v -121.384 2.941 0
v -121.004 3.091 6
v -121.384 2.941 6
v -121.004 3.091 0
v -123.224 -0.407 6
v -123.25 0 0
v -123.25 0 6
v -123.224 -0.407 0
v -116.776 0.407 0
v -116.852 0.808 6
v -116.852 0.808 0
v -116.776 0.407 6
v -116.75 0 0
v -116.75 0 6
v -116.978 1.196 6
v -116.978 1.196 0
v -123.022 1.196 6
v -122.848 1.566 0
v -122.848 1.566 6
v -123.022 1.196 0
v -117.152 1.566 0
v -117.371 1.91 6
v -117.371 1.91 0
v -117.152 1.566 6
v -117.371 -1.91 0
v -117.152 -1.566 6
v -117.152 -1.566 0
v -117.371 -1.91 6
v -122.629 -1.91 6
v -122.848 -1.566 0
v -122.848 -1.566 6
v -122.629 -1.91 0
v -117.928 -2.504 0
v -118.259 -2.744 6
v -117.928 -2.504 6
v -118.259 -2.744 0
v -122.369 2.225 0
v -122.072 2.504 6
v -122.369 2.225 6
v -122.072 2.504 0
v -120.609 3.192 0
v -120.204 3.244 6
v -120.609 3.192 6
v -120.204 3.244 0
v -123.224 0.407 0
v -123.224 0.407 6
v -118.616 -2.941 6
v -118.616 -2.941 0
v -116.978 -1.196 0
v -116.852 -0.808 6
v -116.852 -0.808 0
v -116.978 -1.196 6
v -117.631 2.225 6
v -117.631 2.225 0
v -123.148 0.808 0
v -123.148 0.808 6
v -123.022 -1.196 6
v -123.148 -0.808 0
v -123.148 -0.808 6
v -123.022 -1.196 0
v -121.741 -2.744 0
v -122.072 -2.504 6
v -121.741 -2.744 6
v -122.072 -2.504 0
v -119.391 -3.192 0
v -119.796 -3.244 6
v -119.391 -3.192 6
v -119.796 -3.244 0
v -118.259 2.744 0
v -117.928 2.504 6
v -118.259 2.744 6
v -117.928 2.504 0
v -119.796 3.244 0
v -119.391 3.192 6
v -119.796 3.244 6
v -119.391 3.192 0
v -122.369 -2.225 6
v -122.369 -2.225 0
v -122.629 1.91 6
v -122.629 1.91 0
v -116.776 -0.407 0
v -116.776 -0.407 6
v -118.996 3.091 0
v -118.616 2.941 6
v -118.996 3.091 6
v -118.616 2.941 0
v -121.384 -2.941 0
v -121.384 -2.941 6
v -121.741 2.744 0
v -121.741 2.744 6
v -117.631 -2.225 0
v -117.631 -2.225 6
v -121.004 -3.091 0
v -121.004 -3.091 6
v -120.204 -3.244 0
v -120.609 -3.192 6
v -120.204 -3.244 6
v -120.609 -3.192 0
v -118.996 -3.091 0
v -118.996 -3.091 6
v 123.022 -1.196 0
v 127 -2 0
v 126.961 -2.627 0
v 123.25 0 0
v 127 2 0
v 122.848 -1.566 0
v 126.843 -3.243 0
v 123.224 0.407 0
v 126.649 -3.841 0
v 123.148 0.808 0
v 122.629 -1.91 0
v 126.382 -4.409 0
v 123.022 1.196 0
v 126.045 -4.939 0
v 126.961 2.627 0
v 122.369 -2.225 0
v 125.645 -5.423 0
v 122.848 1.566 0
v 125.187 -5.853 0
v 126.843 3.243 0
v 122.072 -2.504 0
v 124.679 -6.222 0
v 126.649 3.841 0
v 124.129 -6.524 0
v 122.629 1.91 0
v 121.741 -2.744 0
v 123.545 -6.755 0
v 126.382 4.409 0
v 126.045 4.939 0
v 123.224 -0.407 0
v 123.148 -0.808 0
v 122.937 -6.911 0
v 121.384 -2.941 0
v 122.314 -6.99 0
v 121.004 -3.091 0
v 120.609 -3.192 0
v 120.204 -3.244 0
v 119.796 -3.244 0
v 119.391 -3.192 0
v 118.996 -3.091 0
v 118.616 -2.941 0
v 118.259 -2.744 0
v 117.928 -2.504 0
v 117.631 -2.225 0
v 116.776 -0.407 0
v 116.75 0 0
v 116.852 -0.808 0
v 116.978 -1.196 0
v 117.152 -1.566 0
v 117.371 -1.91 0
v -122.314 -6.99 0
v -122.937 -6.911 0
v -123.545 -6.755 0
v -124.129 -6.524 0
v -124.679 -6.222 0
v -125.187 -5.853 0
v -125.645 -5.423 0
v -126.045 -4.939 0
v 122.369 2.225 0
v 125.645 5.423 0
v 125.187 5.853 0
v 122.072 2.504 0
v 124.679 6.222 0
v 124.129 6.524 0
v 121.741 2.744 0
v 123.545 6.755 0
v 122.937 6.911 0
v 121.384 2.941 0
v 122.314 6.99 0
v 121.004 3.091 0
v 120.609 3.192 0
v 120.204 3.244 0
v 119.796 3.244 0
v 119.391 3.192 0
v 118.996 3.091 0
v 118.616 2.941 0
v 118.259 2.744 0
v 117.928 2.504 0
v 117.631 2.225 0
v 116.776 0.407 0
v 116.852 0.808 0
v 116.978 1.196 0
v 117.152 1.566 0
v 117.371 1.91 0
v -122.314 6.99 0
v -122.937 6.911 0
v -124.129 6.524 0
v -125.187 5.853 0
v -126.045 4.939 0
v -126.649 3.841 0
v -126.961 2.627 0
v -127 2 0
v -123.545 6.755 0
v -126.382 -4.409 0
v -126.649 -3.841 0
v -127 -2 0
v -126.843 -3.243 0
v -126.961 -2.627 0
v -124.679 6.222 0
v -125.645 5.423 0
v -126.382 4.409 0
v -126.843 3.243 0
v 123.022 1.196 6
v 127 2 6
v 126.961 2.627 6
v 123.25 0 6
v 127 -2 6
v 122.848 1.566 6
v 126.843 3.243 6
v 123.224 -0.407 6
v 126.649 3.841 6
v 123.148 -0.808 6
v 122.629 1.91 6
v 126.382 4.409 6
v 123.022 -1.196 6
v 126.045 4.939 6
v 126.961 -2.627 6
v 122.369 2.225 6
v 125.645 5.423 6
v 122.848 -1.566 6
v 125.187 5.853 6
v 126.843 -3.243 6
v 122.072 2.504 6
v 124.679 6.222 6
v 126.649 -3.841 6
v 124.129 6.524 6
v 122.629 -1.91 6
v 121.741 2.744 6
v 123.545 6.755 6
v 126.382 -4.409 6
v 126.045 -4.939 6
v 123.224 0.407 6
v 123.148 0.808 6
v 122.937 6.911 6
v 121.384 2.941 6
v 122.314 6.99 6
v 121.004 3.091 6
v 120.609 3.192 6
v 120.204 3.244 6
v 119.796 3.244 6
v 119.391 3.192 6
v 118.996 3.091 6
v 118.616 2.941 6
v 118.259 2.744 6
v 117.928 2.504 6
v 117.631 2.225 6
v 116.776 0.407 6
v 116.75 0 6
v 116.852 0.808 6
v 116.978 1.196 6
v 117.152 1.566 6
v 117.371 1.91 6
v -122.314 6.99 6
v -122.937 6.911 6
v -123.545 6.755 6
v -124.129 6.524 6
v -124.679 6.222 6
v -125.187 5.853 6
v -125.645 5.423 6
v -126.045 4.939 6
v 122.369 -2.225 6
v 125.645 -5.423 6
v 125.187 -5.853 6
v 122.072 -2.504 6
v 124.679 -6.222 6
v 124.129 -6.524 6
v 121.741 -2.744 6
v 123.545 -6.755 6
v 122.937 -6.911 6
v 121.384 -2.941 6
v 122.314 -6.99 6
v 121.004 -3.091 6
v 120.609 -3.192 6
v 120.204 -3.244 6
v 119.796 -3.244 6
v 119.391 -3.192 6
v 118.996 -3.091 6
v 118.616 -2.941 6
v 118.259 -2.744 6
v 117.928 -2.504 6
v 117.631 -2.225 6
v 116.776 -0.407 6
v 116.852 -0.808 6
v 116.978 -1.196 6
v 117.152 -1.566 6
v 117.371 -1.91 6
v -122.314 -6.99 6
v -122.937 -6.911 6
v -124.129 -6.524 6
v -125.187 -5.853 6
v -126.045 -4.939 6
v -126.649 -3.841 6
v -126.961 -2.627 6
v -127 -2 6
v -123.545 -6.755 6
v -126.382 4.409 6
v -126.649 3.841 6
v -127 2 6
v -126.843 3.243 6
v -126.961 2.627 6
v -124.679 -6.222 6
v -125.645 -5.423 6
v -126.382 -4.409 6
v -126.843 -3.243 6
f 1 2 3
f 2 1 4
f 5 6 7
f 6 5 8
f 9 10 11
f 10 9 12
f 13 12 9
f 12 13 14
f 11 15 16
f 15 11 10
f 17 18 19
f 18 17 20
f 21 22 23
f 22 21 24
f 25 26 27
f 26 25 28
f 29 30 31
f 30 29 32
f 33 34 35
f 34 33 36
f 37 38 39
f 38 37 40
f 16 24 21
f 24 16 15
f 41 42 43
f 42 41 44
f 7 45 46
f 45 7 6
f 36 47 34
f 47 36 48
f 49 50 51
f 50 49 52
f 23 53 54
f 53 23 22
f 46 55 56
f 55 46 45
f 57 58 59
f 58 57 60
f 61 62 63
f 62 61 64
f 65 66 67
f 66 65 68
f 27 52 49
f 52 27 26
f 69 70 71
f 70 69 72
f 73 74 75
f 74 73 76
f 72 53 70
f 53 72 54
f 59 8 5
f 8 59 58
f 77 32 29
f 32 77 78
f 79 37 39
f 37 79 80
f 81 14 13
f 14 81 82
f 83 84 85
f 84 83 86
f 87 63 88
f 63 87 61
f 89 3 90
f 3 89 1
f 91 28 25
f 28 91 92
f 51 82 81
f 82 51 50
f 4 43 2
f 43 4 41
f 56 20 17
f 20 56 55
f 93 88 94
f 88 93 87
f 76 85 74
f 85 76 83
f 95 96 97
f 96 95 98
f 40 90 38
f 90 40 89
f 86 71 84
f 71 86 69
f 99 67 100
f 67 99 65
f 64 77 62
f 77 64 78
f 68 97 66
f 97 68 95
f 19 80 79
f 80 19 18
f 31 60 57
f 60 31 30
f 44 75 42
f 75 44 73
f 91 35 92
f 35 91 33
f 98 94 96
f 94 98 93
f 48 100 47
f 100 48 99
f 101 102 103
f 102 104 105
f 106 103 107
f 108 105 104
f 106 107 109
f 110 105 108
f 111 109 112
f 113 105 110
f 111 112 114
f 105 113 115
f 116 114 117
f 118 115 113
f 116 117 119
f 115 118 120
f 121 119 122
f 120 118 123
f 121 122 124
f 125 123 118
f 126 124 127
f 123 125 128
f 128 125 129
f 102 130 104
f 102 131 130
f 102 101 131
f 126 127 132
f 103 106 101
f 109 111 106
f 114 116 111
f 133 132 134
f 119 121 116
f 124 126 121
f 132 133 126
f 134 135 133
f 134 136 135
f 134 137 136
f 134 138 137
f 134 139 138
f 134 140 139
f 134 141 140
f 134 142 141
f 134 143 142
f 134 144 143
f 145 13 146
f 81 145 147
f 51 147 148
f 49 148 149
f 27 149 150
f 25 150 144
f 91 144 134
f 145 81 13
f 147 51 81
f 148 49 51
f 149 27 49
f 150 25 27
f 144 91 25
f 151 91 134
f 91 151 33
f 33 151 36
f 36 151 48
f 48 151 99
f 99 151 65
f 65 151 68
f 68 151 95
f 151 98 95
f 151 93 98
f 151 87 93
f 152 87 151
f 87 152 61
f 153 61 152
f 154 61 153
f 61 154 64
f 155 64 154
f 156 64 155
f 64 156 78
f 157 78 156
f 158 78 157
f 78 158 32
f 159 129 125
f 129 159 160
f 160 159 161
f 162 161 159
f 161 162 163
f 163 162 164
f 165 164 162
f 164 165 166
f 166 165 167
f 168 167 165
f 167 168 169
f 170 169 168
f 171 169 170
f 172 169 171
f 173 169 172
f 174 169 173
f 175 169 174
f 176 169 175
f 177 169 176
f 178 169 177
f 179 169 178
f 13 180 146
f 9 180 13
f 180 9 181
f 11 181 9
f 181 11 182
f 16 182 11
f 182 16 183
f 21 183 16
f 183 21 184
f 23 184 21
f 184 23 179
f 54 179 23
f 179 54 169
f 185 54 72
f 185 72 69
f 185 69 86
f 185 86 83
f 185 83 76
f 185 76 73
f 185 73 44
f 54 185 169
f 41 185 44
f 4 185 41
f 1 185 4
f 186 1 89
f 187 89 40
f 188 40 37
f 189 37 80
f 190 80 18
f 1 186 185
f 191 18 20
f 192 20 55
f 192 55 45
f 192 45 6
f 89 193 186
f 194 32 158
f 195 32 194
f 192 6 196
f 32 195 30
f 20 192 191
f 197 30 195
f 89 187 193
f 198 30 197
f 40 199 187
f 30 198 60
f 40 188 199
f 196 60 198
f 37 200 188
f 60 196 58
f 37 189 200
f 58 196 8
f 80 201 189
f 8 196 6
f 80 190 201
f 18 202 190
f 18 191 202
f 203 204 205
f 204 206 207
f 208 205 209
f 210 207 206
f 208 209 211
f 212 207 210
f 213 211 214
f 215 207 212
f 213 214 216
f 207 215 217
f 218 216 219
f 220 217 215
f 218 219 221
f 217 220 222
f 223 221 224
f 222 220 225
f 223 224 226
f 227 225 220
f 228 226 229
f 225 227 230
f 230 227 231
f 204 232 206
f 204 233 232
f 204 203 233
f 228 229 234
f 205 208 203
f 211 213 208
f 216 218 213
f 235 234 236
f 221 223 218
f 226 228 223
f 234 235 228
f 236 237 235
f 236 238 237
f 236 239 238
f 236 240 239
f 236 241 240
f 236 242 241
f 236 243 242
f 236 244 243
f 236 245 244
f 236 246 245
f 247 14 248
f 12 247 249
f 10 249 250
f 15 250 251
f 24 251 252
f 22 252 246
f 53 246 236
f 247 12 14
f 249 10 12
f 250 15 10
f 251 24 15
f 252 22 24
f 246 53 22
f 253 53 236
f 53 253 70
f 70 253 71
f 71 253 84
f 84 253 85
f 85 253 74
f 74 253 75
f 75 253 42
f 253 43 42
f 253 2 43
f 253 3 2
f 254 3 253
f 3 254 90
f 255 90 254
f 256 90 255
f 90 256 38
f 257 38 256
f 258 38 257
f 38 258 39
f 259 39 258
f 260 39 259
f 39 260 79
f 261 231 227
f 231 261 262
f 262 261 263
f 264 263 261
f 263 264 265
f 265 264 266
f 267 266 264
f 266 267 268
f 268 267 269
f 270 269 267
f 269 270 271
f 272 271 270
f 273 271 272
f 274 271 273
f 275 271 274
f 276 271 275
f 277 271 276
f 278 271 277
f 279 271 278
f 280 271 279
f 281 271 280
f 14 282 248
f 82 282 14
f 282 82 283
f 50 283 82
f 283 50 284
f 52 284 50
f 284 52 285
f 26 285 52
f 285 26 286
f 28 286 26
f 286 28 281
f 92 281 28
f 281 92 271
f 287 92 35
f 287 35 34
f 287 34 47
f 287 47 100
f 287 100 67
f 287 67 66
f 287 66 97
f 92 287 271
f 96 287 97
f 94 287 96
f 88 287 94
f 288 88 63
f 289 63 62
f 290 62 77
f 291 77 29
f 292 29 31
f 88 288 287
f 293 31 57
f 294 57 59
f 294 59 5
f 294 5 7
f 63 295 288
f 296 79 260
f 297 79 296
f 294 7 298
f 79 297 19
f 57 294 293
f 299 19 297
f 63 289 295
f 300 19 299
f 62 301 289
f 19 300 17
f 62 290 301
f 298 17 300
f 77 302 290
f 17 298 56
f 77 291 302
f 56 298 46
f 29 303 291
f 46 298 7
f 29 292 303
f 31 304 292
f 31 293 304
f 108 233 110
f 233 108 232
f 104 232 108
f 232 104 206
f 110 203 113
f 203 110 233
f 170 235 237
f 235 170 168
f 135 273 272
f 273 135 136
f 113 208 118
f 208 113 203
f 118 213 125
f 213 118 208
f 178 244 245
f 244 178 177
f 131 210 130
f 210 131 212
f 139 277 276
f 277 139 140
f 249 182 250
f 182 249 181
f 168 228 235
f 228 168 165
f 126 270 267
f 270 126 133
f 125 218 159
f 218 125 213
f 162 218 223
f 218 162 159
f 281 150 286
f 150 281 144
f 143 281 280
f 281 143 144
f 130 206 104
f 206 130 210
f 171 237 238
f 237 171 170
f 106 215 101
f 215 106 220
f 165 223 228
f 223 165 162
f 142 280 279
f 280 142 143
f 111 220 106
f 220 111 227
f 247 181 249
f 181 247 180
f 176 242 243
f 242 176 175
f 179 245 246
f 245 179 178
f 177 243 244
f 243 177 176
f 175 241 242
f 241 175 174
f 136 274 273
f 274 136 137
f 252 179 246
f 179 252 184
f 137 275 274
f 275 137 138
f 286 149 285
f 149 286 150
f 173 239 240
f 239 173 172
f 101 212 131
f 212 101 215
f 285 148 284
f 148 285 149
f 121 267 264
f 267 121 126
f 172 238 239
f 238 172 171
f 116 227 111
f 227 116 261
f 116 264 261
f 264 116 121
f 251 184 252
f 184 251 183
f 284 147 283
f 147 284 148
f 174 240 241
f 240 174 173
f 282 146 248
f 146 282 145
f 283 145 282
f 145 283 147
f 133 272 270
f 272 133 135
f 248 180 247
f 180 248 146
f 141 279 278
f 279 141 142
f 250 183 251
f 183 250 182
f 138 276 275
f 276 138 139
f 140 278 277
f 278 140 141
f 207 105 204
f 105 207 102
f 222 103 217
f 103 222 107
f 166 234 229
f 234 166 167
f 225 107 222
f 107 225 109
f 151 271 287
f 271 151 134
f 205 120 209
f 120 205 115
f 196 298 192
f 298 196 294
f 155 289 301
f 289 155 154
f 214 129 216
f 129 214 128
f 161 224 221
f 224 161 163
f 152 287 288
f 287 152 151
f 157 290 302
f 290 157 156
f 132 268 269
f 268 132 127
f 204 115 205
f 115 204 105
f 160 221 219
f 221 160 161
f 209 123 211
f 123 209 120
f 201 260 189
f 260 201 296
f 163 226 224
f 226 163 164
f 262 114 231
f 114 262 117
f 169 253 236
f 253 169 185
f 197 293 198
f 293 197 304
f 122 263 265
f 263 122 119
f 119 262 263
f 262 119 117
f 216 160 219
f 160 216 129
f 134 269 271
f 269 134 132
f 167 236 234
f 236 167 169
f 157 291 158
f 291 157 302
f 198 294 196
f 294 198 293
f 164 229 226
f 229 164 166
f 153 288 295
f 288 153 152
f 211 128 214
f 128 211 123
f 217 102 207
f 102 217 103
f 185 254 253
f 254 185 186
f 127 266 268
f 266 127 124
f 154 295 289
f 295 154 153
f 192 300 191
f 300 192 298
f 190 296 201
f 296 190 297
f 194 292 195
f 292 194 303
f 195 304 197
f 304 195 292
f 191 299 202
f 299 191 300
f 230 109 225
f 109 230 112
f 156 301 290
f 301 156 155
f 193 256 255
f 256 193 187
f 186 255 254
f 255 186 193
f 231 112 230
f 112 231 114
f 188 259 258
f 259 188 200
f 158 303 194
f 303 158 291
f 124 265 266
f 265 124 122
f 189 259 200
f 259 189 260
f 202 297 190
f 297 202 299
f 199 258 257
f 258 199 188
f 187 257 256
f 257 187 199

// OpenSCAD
$fn = 50;


difference() {
	union() {
		hull() {
			translate(v = [-122.0000000000, 2.0000000000, 0]) {
				cylinder(h = 6, r = 5);
			}
			translate(v = [122.0000000000, 2.0000000000, 0]) {
				cylinder(h = 6, r = 5);
			}
			translate(v = [-122.0000000000, -2.0000000000, 0]) {
				cylinder(h = 6, r = 5);
			}
			translate(v = [122.0000000000, -2.0000000000, 0]) {
				cylinder(h = 6, r = 5);
			}
		}
	}
	union() {
		translate(v = [-120.0000000000, 0.0000000000, 0]) {
			cylinder(h = 6, r = 3.2500000000);
		}
		translate(v = [120.0000000000, 0.0000000000, 0]) {
			cylinder(h = 6, r = 3.2500000000);
		}
		translate(v = [-120.0000000000, 0.0000000000, 0]) {
			cylinder(h = 6, r = 1.8000000000);
		}
		translate(v = [120.0000000000, 0.0000000000, 0]) {
			cylinder(h = 6, r = 1.8000000000);
		}
		translate(v = [-120.0000000000, 0.0000000000, 0]) {
			cylinder(h = 6, r = 1.8000000000);
		}
		translate(v = [120.0000000000, 0.0000000000, 0]) {
			cylinder(h = 6, r = 1.8000000000);
		}
		translate(v = [-120.0000000000, 0.0000000000, 0]) {
			cylinder(h = 6, r = 1.8000000000);
		}
		translate(v = [120.0000000000, 0.0000000000, 0]) {
			cylinder(h = 6, r = 1.8000000000);
		}
	}
}
